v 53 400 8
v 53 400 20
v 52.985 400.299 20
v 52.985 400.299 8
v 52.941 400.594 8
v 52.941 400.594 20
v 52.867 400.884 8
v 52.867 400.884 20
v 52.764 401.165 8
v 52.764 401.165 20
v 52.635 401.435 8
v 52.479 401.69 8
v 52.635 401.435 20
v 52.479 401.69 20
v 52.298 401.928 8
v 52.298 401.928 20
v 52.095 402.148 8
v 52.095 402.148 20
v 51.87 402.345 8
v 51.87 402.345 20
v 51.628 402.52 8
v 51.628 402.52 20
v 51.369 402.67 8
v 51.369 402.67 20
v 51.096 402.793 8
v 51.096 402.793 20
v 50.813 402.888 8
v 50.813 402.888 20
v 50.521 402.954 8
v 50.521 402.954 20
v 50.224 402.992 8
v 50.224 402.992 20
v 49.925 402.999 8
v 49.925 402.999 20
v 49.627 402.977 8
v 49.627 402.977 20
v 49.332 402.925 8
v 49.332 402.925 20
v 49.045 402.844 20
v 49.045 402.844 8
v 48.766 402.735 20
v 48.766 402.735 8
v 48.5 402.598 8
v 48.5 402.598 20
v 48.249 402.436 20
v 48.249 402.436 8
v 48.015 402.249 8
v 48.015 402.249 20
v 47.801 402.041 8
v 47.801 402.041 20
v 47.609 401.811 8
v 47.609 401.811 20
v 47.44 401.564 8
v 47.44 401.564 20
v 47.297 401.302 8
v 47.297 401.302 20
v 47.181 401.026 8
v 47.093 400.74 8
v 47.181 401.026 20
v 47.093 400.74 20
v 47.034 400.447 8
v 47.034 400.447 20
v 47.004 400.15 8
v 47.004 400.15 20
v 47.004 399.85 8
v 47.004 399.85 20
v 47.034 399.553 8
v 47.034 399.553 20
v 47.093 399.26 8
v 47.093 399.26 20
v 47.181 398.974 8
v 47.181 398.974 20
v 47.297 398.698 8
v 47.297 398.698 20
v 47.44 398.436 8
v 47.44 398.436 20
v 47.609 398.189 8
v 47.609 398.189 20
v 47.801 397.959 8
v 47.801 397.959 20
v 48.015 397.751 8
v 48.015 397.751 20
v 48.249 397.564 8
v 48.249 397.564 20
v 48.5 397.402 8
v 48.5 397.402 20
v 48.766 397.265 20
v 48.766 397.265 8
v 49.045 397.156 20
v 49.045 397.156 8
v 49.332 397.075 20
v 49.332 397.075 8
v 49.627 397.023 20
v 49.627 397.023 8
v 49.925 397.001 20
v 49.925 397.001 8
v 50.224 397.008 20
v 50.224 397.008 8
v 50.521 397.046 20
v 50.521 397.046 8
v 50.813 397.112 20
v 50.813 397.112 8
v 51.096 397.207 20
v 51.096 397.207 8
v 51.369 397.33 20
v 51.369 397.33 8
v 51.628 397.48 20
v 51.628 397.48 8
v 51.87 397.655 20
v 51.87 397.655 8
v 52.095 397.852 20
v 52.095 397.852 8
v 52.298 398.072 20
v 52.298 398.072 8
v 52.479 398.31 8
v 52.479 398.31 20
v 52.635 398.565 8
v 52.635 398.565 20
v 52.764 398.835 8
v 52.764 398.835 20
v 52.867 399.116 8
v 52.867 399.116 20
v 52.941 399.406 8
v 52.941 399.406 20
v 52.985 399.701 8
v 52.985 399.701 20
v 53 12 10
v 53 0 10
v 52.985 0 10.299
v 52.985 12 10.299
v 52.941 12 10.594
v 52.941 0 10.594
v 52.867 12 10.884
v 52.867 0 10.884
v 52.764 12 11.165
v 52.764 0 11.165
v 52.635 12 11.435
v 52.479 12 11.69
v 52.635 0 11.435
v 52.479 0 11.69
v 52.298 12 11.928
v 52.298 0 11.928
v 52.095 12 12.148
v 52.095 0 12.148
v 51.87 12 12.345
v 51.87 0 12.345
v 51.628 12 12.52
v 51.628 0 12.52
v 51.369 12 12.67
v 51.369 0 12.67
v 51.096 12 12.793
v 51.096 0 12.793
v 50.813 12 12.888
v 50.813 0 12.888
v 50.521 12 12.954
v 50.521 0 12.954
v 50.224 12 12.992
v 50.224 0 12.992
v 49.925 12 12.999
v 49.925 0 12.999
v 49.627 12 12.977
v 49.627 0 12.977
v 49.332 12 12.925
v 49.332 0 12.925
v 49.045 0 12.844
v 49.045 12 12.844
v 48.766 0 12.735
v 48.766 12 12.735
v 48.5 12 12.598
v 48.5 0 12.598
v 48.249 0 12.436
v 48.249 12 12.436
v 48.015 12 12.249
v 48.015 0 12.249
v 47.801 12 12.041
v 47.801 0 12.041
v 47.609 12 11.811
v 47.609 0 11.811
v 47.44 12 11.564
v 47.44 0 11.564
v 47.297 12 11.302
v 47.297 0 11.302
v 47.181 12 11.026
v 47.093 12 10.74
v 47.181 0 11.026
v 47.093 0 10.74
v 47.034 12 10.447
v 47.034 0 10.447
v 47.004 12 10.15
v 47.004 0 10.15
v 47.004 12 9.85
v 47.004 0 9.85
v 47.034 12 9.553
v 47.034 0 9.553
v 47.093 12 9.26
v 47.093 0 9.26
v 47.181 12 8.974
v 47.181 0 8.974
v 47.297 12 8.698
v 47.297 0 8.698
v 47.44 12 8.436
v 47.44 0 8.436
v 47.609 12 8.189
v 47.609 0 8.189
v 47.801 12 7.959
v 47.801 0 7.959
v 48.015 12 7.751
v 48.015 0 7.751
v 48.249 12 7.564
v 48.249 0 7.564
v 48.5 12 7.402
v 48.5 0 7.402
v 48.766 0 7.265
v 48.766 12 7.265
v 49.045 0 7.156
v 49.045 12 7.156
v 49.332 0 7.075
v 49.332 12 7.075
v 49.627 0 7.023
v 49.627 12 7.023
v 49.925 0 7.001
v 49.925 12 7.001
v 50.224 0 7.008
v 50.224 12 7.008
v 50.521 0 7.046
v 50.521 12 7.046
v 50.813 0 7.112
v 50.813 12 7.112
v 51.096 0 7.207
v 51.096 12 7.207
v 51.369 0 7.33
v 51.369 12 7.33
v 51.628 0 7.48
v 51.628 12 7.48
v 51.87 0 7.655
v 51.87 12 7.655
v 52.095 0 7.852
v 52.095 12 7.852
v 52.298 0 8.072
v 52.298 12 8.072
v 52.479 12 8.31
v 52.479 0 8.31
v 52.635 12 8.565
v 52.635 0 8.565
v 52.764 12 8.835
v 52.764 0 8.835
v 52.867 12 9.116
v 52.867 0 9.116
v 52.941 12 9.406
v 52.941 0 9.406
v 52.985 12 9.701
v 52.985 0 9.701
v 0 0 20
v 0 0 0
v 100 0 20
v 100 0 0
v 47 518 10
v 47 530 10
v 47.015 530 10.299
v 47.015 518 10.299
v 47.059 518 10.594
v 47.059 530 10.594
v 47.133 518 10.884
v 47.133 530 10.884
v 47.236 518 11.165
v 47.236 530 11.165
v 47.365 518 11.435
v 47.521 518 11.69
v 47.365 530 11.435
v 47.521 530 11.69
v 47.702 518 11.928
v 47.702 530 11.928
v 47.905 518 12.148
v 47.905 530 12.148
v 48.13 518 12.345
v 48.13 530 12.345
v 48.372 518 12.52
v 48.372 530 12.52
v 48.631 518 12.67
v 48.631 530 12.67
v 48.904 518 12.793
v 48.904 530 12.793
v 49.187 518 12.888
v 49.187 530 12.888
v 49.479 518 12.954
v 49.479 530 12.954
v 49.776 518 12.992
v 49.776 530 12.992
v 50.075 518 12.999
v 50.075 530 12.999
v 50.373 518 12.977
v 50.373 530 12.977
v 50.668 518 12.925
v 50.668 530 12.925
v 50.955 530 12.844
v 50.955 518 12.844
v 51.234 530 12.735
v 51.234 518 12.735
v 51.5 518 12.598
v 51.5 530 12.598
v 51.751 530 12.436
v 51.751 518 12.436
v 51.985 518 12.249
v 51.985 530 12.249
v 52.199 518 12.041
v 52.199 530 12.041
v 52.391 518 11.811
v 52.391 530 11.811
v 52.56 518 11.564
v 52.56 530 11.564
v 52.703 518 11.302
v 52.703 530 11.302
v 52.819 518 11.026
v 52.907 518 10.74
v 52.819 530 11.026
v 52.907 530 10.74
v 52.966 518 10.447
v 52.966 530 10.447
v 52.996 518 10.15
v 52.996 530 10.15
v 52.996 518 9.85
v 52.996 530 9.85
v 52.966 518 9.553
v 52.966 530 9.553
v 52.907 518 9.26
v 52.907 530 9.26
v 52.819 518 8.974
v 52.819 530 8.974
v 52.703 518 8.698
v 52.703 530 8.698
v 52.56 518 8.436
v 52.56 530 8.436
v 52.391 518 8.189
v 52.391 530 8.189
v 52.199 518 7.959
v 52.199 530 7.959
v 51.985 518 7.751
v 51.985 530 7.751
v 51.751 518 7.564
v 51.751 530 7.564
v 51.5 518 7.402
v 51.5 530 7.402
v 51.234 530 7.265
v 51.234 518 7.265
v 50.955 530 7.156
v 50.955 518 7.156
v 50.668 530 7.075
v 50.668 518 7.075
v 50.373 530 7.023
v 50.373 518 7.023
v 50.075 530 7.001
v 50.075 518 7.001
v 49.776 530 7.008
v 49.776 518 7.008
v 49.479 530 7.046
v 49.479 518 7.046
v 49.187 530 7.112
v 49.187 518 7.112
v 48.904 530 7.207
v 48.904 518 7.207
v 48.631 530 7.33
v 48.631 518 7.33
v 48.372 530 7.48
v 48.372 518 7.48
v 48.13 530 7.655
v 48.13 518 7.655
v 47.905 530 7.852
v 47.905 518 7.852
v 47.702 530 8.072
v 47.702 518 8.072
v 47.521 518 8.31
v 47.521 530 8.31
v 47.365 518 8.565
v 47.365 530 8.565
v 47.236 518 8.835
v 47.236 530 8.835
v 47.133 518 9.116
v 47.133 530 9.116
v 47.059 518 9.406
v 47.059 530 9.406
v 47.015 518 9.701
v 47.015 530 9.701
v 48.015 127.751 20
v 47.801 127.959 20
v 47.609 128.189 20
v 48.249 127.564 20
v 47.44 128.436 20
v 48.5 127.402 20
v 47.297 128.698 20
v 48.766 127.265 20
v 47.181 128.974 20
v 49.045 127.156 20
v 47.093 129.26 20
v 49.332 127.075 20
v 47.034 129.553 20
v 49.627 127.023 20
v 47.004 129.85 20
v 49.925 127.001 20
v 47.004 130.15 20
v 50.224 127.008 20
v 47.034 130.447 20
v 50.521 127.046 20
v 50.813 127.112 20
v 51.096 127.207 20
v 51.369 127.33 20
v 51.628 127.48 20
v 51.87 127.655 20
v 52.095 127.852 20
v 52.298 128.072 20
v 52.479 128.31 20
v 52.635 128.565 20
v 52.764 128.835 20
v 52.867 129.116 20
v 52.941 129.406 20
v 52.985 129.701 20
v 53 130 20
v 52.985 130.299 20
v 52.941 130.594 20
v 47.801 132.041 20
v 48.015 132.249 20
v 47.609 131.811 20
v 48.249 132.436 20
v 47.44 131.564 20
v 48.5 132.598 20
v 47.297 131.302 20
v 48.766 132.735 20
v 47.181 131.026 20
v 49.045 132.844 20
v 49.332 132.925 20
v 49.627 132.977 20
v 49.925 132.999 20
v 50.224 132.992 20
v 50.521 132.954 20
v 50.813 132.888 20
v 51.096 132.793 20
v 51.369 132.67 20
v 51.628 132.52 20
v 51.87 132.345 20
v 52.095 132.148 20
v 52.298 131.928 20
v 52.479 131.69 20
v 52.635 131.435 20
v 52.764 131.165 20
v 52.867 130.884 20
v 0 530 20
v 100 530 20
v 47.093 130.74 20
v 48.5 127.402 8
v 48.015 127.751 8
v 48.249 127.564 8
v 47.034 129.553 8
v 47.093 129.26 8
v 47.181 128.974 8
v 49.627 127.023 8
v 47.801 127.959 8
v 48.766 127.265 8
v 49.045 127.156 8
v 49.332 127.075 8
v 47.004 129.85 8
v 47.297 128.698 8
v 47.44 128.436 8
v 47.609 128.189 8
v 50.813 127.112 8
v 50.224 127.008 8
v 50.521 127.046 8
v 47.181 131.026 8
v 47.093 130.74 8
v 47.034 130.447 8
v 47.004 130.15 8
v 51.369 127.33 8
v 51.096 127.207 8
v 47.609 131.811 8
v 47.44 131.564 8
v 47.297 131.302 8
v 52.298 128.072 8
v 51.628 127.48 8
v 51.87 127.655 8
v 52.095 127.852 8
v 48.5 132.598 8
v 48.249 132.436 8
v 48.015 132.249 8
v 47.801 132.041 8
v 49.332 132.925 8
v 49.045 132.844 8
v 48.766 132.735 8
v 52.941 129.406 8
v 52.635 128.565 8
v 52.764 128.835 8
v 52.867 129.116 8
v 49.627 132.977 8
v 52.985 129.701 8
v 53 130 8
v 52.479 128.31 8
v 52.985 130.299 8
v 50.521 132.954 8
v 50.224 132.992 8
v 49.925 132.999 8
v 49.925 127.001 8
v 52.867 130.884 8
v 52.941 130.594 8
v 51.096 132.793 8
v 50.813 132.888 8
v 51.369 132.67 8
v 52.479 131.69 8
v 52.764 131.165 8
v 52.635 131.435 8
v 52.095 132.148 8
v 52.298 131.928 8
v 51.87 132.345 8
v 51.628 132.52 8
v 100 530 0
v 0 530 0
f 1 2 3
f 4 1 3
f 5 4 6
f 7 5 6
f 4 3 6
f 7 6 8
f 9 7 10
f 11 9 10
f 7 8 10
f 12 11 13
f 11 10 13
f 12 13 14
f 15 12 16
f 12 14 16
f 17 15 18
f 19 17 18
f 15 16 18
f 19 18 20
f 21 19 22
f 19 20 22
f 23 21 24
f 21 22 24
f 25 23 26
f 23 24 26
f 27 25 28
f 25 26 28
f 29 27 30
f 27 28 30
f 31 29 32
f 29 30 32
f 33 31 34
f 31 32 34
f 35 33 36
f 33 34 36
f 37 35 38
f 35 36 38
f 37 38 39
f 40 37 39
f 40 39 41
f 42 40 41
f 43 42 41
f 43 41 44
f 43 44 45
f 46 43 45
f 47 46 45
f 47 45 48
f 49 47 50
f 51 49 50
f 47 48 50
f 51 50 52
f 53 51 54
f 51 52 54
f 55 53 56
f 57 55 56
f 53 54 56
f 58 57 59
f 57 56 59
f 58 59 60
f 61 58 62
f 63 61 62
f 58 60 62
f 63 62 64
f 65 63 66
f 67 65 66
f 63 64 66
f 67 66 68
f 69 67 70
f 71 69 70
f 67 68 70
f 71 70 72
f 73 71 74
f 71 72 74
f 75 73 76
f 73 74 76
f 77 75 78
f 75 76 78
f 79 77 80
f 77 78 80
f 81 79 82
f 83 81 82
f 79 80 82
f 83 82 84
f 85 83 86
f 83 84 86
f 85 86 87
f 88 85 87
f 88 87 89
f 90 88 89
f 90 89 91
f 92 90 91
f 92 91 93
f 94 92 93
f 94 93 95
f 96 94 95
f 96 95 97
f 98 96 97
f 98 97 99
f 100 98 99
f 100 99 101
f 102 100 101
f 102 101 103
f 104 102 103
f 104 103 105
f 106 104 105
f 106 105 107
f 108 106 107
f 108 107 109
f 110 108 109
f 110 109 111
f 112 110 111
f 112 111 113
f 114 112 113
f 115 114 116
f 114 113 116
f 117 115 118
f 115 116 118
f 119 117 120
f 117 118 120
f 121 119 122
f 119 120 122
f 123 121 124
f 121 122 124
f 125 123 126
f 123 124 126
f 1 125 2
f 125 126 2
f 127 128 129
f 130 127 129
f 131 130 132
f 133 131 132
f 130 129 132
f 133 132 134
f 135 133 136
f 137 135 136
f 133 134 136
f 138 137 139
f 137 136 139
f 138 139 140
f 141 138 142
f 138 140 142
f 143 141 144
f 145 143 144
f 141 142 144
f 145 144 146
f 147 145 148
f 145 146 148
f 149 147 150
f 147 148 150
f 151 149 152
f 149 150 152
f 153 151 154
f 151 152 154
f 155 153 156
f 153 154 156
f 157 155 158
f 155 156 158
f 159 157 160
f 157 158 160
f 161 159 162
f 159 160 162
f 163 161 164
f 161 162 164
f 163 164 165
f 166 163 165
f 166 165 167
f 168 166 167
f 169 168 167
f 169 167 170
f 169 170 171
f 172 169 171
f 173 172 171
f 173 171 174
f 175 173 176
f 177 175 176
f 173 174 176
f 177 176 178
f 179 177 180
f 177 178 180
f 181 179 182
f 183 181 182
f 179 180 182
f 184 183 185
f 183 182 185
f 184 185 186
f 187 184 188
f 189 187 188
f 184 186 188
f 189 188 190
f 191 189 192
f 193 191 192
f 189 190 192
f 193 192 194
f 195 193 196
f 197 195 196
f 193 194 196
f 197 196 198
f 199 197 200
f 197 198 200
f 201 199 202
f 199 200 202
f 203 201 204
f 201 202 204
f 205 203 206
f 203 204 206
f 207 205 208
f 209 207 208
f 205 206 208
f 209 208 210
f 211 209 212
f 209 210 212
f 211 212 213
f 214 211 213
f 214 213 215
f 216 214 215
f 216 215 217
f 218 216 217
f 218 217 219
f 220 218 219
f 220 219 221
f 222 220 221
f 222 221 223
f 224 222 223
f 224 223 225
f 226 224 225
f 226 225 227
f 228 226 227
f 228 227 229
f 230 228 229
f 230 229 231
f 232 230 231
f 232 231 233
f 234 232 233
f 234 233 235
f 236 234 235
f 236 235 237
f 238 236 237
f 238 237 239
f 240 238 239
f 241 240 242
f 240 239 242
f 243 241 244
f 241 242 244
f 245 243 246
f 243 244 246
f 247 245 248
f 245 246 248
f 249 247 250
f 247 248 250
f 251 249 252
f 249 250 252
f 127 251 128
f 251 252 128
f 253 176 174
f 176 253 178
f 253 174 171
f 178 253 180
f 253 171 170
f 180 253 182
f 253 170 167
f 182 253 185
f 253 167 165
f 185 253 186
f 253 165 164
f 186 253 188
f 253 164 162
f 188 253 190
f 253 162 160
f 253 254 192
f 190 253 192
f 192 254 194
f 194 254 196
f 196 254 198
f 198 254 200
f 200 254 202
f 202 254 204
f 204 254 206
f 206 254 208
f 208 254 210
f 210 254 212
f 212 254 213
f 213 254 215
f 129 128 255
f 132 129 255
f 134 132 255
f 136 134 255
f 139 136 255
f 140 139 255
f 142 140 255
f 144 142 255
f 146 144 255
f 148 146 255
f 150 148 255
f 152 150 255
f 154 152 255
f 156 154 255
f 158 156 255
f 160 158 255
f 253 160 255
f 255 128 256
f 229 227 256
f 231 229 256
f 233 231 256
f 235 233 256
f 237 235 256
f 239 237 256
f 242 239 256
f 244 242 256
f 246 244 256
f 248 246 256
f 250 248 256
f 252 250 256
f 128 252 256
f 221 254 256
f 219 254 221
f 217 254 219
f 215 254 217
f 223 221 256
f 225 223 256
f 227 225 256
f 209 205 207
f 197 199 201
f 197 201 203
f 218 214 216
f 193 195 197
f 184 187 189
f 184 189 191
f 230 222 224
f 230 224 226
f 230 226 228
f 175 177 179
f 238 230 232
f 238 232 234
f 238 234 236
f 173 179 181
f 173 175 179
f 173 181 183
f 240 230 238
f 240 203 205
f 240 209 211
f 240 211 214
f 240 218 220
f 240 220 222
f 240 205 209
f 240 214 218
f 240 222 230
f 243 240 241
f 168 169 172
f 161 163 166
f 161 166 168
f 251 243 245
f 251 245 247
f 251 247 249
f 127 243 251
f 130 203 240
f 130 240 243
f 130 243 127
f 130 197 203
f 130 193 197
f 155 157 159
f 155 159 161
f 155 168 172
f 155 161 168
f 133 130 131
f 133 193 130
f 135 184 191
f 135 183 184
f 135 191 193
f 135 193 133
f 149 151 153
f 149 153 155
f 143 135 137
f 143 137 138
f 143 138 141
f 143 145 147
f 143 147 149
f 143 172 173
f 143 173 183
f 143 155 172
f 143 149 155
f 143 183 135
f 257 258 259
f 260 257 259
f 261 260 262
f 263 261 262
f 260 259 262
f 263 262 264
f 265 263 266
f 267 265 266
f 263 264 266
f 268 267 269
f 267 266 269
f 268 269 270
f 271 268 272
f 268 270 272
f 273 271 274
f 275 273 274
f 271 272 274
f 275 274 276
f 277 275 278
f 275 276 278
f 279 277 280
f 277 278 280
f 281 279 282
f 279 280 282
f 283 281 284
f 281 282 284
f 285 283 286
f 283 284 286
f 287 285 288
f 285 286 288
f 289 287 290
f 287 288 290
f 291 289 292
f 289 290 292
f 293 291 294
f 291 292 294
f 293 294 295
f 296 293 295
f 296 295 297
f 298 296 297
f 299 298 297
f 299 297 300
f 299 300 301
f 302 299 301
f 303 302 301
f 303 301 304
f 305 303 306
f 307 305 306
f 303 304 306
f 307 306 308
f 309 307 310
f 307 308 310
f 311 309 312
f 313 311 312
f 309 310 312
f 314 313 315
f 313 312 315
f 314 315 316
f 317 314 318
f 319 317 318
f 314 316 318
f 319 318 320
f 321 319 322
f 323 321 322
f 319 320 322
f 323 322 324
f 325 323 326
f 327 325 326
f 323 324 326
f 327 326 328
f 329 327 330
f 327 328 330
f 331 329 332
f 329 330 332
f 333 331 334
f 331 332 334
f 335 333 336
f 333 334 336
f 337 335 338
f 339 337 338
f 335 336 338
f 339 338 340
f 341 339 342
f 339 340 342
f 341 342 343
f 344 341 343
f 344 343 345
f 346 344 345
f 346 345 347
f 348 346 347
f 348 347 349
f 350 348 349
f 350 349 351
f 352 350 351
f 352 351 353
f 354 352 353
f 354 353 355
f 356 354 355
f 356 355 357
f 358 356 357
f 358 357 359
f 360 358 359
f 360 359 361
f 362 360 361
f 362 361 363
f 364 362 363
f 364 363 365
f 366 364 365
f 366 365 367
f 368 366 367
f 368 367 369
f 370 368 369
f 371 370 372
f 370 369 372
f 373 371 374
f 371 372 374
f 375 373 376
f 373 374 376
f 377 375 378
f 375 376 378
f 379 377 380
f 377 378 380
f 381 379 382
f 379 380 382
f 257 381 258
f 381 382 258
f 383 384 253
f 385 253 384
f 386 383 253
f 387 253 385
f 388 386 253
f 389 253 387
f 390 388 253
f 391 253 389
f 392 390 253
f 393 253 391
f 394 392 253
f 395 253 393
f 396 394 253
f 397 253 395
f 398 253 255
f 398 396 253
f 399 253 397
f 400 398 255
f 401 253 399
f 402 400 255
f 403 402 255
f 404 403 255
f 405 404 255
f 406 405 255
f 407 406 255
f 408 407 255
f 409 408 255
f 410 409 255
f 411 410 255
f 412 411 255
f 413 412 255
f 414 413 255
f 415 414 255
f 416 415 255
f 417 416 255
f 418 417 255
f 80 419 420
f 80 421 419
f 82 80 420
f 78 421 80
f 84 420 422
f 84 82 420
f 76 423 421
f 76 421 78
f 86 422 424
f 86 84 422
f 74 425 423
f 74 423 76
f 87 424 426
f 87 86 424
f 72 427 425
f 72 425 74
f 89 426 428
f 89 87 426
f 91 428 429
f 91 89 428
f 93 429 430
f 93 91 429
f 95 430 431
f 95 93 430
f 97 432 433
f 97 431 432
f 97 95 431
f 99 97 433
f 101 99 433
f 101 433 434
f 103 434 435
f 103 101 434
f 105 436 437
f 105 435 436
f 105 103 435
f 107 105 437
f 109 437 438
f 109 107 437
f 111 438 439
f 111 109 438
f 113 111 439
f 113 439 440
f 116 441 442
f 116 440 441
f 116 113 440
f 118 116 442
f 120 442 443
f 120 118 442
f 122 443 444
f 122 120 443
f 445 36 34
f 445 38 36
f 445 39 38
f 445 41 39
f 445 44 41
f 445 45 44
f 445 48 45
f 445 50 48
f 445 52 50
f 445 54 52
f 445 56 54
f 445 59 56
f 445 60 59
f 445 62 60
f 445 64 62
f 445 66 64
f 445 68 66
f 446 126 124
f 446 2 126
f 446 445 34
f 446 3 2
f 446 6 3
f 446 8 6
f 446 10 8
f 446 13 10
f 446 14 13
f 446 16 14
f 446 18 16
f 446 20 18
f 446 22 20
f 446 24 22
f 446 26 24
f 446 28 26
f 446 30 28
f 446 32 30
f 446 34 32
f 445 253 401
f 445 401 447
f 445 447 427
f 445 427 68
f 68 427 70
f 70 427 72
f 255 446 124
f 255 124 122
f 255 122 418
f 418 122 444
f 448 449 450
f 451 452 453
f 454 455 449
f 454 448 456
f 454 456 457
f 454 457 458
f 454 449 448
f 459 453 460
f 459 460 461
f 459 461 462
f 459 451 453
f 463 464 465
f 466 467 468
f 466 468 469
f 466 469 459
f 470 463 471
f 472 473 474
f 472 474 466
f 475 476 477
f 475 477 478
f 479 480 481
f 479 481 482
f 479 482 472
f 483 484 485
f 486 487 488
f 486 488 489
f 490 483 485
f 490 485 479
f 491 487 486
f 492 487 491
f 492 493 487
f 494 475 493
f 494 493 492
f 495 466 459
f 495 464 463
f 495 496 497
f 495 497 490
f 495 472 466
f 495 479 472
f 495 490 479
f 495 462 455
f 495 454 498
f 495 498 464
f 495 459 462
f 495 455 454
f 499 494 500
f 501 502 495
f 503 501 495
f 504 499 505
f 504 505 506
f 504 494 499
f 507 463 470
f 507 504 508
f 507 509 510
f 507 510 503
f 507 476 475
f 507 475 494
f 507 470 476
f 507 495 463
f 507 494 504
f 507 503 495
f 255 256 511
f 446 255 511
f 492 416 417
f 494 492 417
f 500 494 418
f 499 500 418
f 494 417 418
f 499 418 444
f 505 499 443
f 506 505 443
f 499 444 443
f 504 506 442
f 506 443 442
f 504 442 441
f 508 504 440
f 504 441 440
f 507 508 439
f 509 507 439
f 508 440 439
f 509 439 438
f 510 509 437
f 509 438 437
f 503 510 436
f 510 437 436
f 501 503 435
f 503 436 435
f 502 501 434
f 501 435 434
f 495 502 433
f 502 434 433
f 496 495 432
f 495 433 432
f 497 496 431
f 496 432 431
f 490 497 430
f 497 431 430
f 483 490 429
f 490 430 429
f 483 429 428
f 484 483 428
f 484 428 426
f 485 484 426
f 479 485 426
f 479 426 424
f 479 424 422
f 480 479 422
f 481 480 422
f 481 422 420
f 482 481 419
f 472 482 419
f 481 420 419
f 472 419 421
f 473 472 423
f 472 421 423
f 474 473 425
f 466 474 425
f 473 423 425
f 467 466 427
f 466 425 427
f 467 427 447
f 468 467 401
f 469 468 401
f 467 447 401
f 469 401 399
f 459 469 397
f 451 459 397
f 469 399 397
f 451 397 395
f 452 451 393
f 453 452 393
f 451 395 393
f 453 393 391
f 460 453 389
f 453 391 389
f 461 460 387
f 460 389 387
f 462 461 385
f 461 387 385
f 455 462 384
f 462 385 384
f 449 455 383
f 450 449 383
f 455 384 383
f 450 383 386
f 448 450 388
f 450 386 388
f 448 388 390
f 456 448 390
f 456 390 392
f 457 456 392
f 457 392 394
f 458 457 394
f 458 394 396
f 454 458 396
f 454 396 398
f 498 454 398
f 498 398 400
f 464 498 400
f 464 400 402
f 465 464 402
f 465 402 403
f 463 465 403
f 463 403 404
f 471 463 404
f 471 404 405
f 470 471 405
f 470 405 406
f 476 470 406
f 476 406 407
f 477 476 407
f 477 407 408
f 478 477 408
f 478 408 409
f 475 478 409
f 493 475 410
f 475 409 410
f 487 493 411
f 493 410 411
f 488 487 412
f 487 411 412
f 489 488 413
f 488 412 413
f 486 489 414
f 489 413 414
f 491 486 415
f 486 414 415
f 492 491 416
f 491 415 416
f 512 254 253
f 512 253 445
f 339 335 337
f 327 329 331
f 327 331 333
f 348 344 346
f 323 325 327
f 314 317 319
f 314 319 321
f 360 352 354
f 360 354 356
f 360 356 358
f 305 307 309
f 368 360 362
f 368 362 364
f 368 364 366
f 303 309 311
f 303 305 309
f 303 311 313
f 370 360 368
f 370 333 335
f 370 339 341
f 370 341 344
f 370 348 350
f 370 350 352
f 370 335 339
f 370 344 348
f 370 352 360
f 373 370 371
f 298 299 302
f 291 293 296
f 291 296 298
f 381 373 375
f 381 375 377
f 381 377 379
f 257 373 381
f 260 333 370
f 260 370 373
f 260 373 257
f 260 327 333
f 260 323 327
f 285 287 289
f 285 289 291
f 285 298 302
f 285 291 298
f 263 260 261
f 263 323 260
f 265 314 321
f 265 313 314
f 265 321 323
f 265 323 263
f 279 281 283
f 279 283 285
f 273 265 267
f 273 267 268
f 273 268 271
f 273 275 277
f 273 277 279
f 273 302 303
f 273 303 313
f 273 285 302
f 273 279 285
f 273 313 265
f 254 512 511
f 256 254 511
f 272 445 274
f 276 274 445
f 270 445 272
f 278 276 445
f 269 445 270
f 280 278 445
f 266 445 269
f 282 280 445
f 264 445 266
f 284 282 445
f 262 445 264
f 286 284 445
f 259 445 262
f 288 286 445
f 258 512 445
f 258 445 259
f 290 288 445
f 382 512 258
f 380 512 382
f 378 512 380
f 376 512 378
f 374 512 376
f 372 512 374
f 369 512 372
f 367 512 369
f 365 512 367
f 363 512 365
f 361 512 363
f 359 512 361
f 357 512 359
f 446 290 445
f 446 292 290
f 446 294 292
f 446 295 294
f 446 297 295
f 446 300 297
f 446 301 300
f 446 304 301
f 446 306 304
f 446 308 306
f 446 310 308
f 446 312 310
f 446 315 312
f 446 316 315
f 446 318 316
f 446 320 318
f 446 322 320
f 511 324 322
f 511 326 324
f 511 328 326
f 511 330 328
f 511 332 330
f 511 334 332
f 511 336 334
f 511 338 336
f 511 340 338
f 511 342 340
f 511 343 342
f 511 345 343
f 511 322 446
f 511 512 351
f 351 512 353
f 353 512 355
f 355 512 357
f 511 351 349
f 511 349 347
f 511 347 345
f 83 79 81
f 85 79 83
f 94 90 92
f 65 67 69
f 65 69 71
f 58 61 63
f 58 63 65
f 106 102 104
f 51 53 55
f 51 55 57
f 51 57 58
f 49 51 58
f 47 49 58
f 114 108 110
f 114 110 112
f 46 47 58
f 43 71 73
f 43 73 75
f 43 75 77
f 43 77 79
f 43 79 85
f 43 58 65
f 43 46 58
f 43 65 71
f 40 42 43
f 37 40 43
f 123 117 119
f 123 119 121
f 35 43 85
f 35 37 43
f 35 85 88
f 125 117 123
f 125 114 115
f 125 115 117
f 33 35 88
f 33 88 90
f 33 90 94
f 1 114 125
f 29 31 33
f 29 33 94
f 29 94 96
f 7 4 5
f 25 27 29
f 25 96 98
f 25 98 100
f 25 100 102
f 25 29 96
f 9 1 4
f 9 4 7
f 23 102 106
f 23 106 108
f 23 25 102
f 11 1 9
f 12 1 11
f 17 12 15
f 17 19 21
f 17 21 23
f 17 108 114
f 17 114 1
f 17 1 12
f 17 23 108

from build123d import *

# Parameters (mm, degrees)
F0_W     = 100
F0_H     = 530
F1_DEPTH = 20
F2_R     = 3
F3_DEPTH = 12
F4_R     = 3
F5_DEPTH = 12
F6_R     = 3
F7_DEPTH = 12
F8_R     = 3
F9_DEPTH = 12


with BuildPart() as f1:
    # F0 (on Top) → F1 (new body)
    with BuildSketch(Plane.XY):
        with Locations((50, 265)):
            Rectangle(F0_W, F0_H)
    extrude(amount=F1_DEPTH)

    # F2 (on face) → F3 (cut)
    with BuildSketch(Plane.XY.offset(20)):
        with Locations((50, 130)):
            Circle(F2_R)
    extrude(amount=-F3_DEPTH, mode=Mode.SUBTRACT)

    # F4 (on face) → F5 (cut)
    with BuildSketch(Plane.XZ):
        with Locations((50, 10)):
            Circle(F4_R)
    extrude(amount=-F5_DEPTH, mode=Mode.SUBTRACT)

    # F6 (on face) → F7 (cut)
    with BuildSketch(Plane(origin=(0, 530, 0), x_dir=(-1, 0, 0), z_dir=(0, 1, 0))):
        with Locations((-50, 10)):
            Circle(F6_R)
    extrude(amount=-F7_DEPTH, mode=Mode.SUBTRACT)

    # F8 (on face) → F9 (cut)
    with BuildSketch(Plane.XY.offset(20)):
        with Locations((50, 400)):
            Circle(F8_R)
    extrude(amount=-F9_DEPTH, mode=Mode.SUBTRACT)


solid = f1.part
